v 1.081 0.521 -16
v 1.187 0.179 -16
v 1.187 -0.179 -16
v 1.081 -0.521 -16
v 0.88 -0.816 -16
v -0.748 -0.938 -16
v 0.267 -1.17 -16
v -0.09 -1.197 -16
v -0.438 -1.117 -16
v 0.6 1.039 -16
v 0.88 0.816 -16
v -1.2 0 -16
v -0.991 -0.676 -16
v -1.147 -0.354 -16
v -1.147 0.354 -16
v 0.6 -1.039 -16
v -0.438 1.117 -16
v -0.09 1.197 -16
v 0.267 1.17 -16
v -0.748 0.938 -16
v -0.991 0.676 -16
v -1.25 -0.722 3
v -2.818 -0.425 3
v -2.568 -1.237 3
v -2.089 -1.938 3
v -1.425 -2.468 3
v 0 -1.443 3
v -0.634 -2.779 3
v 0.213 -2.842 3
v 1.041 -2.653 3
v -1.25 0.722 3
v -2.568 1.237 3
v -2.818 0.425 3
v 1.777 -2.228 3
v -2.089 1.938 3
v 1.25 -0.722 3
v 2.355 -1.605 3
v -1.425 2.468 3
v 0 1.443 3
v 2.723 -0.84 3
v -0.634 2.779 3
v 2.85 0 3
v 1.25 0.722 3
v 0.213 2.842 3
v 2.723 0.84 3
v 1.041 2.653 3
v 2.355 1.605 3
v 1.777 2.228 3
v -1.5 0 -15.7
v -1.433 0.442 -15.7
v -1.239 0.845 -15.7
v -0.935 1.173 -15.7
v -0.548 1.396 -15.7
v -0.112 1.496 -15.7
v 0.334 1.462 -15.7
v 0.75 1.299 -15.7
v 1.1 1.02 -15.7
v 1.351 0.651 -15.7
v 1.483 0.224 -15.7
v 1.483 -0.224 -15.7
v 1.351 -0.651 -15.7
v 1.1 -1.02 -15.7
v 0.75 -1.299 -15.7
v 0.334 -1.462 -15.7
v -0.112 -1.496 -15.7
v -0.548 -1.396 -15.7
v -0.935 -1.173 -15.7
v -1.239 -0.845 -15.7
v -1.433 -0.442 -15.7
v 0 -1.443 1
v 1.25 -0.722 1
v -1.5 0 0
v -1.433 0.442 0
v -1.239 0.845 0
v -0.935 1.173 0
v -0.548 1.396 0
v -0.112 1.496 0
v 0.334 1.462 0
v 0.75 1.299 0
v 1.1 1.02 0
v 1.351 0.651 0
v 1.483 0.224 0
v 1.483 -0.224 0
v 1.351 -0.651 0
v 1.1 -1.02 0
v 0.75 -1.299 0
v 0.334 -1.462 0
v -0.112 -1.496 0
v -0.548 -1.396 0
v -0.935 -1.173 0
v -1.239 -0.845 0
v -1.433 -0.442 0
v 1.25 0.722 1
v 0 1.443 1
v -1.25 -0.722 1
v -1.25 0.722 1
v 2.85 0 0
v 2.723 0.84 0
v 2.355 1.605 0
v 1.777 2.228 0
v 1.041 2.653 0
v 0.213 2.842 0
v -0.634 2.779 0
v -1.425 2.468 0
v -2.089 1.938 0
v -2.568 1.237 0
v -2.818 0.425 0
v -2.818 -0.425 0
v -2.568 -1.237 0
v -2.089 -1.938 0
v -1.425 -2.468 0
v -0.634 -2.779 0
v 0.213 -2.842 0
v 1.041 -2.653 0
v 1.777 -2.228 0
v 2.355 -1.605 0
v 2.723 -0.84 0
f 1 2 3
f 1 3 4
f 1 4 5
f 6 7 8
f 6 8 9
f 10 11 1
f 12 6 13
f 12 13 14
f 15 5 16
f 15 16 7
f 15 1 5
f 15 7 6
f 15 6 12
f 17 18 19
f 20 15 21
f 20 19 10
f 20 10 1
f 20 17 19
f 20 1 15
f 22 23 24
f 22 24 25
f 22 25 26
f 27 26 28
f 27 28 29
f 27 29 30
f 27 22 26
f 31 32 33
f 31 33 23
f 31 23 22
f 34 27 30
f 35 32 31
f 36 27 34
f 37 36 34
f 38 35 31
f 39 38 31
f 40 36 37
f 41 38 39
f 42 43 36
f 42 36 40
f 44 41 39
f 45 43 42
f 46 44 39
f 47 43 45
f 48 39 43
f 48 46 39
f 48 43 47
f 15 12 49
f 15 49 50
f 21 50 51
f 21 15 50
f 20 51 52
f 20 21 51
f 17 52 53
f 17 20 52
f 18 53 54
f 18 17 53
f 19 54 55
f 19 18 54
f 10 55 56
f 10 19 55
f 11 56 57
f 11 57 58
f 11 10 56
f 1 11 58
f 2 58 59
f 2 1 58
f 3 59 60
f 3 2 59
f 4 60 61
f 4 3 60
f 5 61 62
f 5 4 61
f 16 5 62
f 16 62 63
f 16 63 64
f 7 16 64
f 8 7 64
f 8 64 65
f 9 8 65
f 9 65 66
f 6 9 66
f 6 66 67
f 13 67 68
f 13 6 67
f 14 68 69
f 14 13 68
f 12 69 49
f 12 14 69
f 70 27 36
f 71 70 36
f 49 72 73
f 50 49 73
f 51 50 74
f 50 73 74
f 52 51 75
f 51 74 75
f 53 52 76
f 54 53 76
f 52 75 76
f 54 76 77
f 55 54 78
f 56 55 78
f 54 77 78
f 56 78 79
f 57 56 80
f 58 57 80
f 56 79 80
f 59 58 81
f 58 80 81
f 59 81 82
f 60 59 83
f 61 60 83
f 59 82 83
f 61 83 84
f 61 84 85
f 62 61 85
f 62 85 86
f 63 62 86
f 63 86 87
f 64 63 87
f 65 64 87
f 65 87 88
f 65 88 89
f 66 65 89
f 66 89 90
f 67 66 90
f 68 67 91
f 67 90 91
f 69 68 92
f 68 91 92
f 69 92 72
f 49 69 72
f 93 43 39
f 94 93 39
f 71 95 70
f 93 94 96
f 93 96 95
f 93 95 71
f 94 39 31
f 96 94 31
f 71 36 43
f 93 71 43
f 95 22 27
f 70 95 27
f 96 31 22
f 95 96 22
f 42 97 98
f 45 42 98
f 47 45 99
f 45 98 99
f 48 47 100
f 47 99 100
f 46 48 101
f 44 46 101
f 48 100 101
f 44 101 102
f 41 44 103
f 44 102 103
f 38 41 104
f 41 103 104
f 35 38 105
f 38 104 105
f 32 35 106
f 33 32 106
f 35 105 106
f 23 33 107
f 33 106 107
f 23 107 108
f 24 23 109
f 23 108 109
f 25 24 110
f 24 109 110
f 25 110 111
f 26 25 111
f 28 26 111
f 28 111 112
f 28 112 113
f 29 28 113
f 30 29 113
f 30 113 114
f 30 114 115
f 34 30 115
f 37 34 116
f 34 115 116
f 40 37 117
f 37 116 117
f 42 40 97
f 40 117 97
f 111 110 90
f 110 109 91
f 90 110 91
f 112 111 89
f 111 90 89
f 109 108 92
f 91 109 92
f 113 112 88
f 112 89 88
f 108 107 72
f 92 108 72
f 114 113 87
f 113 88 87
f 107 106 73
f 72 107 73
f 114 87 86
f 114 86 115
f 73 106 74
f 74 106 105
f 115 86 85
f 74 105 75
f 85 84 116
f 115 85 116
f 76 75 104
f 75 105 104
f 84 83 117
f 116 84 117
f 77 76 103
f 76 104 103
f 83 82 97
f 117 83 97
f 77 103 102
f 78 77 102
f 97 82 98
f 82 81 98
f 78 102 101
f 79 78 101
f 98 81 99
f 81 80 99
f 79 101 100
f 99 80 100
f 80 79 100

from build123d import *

# Parameters (mm, degrees)
SKETCH1_R           = 2.85
BOSS_EXTRUDE1_DEPTH = 3
SKETCH2_R           = 1.5
BOSS_EXTRUDE2_DEPTH = 16
CHAMFER1_SIZE       = 0.3
CUT_EXTRUDE1_DEPTH  = 2


with BuildPart() as part:
    # Sketch1 → Boss-Extrude1 (new body)
    with BuildSketch(Plane.XY):
        Circle(SKETCH1_R)
    extrude(amount=BOSS_EXTRUDE1_DEPTH)

    # Sketch2 → Boss-Extrude2 (add)
    with BuildSketch(Plane(origin=(0, 0, 0), x_dir=(-1, 0, 0), z_dir=(0, 0, -1))):
        Circle(SKETCH2_R)
    extrude(amount=BOSS_EXTRUDE2_DEPTH)

    # Chamfer1
    chamfer1_edges = [part.edges().sort_by_distance(p)[0] for p in [
        (1.5, 0, -16),
    ]]
    chamfer(chamfer1_edges, length=CHAMFER1_SIZE)

    # Sketch3 → Cut-Extrude1 (cut)
    with BuildSketch(Plane.XY.offset(3)):
        Polygon((0, 1.443375673), (-1.25, 0.721687836), (-1.25, -0.721687836), (0, -1.443375673), (1.25, -0.721687836), (1.25, 0.721687836), align=None)
    extrude(amount=-CUT_EXTRUDE1_DEPTH, mode=Mode.SUBTRACT)


solid = part.part
